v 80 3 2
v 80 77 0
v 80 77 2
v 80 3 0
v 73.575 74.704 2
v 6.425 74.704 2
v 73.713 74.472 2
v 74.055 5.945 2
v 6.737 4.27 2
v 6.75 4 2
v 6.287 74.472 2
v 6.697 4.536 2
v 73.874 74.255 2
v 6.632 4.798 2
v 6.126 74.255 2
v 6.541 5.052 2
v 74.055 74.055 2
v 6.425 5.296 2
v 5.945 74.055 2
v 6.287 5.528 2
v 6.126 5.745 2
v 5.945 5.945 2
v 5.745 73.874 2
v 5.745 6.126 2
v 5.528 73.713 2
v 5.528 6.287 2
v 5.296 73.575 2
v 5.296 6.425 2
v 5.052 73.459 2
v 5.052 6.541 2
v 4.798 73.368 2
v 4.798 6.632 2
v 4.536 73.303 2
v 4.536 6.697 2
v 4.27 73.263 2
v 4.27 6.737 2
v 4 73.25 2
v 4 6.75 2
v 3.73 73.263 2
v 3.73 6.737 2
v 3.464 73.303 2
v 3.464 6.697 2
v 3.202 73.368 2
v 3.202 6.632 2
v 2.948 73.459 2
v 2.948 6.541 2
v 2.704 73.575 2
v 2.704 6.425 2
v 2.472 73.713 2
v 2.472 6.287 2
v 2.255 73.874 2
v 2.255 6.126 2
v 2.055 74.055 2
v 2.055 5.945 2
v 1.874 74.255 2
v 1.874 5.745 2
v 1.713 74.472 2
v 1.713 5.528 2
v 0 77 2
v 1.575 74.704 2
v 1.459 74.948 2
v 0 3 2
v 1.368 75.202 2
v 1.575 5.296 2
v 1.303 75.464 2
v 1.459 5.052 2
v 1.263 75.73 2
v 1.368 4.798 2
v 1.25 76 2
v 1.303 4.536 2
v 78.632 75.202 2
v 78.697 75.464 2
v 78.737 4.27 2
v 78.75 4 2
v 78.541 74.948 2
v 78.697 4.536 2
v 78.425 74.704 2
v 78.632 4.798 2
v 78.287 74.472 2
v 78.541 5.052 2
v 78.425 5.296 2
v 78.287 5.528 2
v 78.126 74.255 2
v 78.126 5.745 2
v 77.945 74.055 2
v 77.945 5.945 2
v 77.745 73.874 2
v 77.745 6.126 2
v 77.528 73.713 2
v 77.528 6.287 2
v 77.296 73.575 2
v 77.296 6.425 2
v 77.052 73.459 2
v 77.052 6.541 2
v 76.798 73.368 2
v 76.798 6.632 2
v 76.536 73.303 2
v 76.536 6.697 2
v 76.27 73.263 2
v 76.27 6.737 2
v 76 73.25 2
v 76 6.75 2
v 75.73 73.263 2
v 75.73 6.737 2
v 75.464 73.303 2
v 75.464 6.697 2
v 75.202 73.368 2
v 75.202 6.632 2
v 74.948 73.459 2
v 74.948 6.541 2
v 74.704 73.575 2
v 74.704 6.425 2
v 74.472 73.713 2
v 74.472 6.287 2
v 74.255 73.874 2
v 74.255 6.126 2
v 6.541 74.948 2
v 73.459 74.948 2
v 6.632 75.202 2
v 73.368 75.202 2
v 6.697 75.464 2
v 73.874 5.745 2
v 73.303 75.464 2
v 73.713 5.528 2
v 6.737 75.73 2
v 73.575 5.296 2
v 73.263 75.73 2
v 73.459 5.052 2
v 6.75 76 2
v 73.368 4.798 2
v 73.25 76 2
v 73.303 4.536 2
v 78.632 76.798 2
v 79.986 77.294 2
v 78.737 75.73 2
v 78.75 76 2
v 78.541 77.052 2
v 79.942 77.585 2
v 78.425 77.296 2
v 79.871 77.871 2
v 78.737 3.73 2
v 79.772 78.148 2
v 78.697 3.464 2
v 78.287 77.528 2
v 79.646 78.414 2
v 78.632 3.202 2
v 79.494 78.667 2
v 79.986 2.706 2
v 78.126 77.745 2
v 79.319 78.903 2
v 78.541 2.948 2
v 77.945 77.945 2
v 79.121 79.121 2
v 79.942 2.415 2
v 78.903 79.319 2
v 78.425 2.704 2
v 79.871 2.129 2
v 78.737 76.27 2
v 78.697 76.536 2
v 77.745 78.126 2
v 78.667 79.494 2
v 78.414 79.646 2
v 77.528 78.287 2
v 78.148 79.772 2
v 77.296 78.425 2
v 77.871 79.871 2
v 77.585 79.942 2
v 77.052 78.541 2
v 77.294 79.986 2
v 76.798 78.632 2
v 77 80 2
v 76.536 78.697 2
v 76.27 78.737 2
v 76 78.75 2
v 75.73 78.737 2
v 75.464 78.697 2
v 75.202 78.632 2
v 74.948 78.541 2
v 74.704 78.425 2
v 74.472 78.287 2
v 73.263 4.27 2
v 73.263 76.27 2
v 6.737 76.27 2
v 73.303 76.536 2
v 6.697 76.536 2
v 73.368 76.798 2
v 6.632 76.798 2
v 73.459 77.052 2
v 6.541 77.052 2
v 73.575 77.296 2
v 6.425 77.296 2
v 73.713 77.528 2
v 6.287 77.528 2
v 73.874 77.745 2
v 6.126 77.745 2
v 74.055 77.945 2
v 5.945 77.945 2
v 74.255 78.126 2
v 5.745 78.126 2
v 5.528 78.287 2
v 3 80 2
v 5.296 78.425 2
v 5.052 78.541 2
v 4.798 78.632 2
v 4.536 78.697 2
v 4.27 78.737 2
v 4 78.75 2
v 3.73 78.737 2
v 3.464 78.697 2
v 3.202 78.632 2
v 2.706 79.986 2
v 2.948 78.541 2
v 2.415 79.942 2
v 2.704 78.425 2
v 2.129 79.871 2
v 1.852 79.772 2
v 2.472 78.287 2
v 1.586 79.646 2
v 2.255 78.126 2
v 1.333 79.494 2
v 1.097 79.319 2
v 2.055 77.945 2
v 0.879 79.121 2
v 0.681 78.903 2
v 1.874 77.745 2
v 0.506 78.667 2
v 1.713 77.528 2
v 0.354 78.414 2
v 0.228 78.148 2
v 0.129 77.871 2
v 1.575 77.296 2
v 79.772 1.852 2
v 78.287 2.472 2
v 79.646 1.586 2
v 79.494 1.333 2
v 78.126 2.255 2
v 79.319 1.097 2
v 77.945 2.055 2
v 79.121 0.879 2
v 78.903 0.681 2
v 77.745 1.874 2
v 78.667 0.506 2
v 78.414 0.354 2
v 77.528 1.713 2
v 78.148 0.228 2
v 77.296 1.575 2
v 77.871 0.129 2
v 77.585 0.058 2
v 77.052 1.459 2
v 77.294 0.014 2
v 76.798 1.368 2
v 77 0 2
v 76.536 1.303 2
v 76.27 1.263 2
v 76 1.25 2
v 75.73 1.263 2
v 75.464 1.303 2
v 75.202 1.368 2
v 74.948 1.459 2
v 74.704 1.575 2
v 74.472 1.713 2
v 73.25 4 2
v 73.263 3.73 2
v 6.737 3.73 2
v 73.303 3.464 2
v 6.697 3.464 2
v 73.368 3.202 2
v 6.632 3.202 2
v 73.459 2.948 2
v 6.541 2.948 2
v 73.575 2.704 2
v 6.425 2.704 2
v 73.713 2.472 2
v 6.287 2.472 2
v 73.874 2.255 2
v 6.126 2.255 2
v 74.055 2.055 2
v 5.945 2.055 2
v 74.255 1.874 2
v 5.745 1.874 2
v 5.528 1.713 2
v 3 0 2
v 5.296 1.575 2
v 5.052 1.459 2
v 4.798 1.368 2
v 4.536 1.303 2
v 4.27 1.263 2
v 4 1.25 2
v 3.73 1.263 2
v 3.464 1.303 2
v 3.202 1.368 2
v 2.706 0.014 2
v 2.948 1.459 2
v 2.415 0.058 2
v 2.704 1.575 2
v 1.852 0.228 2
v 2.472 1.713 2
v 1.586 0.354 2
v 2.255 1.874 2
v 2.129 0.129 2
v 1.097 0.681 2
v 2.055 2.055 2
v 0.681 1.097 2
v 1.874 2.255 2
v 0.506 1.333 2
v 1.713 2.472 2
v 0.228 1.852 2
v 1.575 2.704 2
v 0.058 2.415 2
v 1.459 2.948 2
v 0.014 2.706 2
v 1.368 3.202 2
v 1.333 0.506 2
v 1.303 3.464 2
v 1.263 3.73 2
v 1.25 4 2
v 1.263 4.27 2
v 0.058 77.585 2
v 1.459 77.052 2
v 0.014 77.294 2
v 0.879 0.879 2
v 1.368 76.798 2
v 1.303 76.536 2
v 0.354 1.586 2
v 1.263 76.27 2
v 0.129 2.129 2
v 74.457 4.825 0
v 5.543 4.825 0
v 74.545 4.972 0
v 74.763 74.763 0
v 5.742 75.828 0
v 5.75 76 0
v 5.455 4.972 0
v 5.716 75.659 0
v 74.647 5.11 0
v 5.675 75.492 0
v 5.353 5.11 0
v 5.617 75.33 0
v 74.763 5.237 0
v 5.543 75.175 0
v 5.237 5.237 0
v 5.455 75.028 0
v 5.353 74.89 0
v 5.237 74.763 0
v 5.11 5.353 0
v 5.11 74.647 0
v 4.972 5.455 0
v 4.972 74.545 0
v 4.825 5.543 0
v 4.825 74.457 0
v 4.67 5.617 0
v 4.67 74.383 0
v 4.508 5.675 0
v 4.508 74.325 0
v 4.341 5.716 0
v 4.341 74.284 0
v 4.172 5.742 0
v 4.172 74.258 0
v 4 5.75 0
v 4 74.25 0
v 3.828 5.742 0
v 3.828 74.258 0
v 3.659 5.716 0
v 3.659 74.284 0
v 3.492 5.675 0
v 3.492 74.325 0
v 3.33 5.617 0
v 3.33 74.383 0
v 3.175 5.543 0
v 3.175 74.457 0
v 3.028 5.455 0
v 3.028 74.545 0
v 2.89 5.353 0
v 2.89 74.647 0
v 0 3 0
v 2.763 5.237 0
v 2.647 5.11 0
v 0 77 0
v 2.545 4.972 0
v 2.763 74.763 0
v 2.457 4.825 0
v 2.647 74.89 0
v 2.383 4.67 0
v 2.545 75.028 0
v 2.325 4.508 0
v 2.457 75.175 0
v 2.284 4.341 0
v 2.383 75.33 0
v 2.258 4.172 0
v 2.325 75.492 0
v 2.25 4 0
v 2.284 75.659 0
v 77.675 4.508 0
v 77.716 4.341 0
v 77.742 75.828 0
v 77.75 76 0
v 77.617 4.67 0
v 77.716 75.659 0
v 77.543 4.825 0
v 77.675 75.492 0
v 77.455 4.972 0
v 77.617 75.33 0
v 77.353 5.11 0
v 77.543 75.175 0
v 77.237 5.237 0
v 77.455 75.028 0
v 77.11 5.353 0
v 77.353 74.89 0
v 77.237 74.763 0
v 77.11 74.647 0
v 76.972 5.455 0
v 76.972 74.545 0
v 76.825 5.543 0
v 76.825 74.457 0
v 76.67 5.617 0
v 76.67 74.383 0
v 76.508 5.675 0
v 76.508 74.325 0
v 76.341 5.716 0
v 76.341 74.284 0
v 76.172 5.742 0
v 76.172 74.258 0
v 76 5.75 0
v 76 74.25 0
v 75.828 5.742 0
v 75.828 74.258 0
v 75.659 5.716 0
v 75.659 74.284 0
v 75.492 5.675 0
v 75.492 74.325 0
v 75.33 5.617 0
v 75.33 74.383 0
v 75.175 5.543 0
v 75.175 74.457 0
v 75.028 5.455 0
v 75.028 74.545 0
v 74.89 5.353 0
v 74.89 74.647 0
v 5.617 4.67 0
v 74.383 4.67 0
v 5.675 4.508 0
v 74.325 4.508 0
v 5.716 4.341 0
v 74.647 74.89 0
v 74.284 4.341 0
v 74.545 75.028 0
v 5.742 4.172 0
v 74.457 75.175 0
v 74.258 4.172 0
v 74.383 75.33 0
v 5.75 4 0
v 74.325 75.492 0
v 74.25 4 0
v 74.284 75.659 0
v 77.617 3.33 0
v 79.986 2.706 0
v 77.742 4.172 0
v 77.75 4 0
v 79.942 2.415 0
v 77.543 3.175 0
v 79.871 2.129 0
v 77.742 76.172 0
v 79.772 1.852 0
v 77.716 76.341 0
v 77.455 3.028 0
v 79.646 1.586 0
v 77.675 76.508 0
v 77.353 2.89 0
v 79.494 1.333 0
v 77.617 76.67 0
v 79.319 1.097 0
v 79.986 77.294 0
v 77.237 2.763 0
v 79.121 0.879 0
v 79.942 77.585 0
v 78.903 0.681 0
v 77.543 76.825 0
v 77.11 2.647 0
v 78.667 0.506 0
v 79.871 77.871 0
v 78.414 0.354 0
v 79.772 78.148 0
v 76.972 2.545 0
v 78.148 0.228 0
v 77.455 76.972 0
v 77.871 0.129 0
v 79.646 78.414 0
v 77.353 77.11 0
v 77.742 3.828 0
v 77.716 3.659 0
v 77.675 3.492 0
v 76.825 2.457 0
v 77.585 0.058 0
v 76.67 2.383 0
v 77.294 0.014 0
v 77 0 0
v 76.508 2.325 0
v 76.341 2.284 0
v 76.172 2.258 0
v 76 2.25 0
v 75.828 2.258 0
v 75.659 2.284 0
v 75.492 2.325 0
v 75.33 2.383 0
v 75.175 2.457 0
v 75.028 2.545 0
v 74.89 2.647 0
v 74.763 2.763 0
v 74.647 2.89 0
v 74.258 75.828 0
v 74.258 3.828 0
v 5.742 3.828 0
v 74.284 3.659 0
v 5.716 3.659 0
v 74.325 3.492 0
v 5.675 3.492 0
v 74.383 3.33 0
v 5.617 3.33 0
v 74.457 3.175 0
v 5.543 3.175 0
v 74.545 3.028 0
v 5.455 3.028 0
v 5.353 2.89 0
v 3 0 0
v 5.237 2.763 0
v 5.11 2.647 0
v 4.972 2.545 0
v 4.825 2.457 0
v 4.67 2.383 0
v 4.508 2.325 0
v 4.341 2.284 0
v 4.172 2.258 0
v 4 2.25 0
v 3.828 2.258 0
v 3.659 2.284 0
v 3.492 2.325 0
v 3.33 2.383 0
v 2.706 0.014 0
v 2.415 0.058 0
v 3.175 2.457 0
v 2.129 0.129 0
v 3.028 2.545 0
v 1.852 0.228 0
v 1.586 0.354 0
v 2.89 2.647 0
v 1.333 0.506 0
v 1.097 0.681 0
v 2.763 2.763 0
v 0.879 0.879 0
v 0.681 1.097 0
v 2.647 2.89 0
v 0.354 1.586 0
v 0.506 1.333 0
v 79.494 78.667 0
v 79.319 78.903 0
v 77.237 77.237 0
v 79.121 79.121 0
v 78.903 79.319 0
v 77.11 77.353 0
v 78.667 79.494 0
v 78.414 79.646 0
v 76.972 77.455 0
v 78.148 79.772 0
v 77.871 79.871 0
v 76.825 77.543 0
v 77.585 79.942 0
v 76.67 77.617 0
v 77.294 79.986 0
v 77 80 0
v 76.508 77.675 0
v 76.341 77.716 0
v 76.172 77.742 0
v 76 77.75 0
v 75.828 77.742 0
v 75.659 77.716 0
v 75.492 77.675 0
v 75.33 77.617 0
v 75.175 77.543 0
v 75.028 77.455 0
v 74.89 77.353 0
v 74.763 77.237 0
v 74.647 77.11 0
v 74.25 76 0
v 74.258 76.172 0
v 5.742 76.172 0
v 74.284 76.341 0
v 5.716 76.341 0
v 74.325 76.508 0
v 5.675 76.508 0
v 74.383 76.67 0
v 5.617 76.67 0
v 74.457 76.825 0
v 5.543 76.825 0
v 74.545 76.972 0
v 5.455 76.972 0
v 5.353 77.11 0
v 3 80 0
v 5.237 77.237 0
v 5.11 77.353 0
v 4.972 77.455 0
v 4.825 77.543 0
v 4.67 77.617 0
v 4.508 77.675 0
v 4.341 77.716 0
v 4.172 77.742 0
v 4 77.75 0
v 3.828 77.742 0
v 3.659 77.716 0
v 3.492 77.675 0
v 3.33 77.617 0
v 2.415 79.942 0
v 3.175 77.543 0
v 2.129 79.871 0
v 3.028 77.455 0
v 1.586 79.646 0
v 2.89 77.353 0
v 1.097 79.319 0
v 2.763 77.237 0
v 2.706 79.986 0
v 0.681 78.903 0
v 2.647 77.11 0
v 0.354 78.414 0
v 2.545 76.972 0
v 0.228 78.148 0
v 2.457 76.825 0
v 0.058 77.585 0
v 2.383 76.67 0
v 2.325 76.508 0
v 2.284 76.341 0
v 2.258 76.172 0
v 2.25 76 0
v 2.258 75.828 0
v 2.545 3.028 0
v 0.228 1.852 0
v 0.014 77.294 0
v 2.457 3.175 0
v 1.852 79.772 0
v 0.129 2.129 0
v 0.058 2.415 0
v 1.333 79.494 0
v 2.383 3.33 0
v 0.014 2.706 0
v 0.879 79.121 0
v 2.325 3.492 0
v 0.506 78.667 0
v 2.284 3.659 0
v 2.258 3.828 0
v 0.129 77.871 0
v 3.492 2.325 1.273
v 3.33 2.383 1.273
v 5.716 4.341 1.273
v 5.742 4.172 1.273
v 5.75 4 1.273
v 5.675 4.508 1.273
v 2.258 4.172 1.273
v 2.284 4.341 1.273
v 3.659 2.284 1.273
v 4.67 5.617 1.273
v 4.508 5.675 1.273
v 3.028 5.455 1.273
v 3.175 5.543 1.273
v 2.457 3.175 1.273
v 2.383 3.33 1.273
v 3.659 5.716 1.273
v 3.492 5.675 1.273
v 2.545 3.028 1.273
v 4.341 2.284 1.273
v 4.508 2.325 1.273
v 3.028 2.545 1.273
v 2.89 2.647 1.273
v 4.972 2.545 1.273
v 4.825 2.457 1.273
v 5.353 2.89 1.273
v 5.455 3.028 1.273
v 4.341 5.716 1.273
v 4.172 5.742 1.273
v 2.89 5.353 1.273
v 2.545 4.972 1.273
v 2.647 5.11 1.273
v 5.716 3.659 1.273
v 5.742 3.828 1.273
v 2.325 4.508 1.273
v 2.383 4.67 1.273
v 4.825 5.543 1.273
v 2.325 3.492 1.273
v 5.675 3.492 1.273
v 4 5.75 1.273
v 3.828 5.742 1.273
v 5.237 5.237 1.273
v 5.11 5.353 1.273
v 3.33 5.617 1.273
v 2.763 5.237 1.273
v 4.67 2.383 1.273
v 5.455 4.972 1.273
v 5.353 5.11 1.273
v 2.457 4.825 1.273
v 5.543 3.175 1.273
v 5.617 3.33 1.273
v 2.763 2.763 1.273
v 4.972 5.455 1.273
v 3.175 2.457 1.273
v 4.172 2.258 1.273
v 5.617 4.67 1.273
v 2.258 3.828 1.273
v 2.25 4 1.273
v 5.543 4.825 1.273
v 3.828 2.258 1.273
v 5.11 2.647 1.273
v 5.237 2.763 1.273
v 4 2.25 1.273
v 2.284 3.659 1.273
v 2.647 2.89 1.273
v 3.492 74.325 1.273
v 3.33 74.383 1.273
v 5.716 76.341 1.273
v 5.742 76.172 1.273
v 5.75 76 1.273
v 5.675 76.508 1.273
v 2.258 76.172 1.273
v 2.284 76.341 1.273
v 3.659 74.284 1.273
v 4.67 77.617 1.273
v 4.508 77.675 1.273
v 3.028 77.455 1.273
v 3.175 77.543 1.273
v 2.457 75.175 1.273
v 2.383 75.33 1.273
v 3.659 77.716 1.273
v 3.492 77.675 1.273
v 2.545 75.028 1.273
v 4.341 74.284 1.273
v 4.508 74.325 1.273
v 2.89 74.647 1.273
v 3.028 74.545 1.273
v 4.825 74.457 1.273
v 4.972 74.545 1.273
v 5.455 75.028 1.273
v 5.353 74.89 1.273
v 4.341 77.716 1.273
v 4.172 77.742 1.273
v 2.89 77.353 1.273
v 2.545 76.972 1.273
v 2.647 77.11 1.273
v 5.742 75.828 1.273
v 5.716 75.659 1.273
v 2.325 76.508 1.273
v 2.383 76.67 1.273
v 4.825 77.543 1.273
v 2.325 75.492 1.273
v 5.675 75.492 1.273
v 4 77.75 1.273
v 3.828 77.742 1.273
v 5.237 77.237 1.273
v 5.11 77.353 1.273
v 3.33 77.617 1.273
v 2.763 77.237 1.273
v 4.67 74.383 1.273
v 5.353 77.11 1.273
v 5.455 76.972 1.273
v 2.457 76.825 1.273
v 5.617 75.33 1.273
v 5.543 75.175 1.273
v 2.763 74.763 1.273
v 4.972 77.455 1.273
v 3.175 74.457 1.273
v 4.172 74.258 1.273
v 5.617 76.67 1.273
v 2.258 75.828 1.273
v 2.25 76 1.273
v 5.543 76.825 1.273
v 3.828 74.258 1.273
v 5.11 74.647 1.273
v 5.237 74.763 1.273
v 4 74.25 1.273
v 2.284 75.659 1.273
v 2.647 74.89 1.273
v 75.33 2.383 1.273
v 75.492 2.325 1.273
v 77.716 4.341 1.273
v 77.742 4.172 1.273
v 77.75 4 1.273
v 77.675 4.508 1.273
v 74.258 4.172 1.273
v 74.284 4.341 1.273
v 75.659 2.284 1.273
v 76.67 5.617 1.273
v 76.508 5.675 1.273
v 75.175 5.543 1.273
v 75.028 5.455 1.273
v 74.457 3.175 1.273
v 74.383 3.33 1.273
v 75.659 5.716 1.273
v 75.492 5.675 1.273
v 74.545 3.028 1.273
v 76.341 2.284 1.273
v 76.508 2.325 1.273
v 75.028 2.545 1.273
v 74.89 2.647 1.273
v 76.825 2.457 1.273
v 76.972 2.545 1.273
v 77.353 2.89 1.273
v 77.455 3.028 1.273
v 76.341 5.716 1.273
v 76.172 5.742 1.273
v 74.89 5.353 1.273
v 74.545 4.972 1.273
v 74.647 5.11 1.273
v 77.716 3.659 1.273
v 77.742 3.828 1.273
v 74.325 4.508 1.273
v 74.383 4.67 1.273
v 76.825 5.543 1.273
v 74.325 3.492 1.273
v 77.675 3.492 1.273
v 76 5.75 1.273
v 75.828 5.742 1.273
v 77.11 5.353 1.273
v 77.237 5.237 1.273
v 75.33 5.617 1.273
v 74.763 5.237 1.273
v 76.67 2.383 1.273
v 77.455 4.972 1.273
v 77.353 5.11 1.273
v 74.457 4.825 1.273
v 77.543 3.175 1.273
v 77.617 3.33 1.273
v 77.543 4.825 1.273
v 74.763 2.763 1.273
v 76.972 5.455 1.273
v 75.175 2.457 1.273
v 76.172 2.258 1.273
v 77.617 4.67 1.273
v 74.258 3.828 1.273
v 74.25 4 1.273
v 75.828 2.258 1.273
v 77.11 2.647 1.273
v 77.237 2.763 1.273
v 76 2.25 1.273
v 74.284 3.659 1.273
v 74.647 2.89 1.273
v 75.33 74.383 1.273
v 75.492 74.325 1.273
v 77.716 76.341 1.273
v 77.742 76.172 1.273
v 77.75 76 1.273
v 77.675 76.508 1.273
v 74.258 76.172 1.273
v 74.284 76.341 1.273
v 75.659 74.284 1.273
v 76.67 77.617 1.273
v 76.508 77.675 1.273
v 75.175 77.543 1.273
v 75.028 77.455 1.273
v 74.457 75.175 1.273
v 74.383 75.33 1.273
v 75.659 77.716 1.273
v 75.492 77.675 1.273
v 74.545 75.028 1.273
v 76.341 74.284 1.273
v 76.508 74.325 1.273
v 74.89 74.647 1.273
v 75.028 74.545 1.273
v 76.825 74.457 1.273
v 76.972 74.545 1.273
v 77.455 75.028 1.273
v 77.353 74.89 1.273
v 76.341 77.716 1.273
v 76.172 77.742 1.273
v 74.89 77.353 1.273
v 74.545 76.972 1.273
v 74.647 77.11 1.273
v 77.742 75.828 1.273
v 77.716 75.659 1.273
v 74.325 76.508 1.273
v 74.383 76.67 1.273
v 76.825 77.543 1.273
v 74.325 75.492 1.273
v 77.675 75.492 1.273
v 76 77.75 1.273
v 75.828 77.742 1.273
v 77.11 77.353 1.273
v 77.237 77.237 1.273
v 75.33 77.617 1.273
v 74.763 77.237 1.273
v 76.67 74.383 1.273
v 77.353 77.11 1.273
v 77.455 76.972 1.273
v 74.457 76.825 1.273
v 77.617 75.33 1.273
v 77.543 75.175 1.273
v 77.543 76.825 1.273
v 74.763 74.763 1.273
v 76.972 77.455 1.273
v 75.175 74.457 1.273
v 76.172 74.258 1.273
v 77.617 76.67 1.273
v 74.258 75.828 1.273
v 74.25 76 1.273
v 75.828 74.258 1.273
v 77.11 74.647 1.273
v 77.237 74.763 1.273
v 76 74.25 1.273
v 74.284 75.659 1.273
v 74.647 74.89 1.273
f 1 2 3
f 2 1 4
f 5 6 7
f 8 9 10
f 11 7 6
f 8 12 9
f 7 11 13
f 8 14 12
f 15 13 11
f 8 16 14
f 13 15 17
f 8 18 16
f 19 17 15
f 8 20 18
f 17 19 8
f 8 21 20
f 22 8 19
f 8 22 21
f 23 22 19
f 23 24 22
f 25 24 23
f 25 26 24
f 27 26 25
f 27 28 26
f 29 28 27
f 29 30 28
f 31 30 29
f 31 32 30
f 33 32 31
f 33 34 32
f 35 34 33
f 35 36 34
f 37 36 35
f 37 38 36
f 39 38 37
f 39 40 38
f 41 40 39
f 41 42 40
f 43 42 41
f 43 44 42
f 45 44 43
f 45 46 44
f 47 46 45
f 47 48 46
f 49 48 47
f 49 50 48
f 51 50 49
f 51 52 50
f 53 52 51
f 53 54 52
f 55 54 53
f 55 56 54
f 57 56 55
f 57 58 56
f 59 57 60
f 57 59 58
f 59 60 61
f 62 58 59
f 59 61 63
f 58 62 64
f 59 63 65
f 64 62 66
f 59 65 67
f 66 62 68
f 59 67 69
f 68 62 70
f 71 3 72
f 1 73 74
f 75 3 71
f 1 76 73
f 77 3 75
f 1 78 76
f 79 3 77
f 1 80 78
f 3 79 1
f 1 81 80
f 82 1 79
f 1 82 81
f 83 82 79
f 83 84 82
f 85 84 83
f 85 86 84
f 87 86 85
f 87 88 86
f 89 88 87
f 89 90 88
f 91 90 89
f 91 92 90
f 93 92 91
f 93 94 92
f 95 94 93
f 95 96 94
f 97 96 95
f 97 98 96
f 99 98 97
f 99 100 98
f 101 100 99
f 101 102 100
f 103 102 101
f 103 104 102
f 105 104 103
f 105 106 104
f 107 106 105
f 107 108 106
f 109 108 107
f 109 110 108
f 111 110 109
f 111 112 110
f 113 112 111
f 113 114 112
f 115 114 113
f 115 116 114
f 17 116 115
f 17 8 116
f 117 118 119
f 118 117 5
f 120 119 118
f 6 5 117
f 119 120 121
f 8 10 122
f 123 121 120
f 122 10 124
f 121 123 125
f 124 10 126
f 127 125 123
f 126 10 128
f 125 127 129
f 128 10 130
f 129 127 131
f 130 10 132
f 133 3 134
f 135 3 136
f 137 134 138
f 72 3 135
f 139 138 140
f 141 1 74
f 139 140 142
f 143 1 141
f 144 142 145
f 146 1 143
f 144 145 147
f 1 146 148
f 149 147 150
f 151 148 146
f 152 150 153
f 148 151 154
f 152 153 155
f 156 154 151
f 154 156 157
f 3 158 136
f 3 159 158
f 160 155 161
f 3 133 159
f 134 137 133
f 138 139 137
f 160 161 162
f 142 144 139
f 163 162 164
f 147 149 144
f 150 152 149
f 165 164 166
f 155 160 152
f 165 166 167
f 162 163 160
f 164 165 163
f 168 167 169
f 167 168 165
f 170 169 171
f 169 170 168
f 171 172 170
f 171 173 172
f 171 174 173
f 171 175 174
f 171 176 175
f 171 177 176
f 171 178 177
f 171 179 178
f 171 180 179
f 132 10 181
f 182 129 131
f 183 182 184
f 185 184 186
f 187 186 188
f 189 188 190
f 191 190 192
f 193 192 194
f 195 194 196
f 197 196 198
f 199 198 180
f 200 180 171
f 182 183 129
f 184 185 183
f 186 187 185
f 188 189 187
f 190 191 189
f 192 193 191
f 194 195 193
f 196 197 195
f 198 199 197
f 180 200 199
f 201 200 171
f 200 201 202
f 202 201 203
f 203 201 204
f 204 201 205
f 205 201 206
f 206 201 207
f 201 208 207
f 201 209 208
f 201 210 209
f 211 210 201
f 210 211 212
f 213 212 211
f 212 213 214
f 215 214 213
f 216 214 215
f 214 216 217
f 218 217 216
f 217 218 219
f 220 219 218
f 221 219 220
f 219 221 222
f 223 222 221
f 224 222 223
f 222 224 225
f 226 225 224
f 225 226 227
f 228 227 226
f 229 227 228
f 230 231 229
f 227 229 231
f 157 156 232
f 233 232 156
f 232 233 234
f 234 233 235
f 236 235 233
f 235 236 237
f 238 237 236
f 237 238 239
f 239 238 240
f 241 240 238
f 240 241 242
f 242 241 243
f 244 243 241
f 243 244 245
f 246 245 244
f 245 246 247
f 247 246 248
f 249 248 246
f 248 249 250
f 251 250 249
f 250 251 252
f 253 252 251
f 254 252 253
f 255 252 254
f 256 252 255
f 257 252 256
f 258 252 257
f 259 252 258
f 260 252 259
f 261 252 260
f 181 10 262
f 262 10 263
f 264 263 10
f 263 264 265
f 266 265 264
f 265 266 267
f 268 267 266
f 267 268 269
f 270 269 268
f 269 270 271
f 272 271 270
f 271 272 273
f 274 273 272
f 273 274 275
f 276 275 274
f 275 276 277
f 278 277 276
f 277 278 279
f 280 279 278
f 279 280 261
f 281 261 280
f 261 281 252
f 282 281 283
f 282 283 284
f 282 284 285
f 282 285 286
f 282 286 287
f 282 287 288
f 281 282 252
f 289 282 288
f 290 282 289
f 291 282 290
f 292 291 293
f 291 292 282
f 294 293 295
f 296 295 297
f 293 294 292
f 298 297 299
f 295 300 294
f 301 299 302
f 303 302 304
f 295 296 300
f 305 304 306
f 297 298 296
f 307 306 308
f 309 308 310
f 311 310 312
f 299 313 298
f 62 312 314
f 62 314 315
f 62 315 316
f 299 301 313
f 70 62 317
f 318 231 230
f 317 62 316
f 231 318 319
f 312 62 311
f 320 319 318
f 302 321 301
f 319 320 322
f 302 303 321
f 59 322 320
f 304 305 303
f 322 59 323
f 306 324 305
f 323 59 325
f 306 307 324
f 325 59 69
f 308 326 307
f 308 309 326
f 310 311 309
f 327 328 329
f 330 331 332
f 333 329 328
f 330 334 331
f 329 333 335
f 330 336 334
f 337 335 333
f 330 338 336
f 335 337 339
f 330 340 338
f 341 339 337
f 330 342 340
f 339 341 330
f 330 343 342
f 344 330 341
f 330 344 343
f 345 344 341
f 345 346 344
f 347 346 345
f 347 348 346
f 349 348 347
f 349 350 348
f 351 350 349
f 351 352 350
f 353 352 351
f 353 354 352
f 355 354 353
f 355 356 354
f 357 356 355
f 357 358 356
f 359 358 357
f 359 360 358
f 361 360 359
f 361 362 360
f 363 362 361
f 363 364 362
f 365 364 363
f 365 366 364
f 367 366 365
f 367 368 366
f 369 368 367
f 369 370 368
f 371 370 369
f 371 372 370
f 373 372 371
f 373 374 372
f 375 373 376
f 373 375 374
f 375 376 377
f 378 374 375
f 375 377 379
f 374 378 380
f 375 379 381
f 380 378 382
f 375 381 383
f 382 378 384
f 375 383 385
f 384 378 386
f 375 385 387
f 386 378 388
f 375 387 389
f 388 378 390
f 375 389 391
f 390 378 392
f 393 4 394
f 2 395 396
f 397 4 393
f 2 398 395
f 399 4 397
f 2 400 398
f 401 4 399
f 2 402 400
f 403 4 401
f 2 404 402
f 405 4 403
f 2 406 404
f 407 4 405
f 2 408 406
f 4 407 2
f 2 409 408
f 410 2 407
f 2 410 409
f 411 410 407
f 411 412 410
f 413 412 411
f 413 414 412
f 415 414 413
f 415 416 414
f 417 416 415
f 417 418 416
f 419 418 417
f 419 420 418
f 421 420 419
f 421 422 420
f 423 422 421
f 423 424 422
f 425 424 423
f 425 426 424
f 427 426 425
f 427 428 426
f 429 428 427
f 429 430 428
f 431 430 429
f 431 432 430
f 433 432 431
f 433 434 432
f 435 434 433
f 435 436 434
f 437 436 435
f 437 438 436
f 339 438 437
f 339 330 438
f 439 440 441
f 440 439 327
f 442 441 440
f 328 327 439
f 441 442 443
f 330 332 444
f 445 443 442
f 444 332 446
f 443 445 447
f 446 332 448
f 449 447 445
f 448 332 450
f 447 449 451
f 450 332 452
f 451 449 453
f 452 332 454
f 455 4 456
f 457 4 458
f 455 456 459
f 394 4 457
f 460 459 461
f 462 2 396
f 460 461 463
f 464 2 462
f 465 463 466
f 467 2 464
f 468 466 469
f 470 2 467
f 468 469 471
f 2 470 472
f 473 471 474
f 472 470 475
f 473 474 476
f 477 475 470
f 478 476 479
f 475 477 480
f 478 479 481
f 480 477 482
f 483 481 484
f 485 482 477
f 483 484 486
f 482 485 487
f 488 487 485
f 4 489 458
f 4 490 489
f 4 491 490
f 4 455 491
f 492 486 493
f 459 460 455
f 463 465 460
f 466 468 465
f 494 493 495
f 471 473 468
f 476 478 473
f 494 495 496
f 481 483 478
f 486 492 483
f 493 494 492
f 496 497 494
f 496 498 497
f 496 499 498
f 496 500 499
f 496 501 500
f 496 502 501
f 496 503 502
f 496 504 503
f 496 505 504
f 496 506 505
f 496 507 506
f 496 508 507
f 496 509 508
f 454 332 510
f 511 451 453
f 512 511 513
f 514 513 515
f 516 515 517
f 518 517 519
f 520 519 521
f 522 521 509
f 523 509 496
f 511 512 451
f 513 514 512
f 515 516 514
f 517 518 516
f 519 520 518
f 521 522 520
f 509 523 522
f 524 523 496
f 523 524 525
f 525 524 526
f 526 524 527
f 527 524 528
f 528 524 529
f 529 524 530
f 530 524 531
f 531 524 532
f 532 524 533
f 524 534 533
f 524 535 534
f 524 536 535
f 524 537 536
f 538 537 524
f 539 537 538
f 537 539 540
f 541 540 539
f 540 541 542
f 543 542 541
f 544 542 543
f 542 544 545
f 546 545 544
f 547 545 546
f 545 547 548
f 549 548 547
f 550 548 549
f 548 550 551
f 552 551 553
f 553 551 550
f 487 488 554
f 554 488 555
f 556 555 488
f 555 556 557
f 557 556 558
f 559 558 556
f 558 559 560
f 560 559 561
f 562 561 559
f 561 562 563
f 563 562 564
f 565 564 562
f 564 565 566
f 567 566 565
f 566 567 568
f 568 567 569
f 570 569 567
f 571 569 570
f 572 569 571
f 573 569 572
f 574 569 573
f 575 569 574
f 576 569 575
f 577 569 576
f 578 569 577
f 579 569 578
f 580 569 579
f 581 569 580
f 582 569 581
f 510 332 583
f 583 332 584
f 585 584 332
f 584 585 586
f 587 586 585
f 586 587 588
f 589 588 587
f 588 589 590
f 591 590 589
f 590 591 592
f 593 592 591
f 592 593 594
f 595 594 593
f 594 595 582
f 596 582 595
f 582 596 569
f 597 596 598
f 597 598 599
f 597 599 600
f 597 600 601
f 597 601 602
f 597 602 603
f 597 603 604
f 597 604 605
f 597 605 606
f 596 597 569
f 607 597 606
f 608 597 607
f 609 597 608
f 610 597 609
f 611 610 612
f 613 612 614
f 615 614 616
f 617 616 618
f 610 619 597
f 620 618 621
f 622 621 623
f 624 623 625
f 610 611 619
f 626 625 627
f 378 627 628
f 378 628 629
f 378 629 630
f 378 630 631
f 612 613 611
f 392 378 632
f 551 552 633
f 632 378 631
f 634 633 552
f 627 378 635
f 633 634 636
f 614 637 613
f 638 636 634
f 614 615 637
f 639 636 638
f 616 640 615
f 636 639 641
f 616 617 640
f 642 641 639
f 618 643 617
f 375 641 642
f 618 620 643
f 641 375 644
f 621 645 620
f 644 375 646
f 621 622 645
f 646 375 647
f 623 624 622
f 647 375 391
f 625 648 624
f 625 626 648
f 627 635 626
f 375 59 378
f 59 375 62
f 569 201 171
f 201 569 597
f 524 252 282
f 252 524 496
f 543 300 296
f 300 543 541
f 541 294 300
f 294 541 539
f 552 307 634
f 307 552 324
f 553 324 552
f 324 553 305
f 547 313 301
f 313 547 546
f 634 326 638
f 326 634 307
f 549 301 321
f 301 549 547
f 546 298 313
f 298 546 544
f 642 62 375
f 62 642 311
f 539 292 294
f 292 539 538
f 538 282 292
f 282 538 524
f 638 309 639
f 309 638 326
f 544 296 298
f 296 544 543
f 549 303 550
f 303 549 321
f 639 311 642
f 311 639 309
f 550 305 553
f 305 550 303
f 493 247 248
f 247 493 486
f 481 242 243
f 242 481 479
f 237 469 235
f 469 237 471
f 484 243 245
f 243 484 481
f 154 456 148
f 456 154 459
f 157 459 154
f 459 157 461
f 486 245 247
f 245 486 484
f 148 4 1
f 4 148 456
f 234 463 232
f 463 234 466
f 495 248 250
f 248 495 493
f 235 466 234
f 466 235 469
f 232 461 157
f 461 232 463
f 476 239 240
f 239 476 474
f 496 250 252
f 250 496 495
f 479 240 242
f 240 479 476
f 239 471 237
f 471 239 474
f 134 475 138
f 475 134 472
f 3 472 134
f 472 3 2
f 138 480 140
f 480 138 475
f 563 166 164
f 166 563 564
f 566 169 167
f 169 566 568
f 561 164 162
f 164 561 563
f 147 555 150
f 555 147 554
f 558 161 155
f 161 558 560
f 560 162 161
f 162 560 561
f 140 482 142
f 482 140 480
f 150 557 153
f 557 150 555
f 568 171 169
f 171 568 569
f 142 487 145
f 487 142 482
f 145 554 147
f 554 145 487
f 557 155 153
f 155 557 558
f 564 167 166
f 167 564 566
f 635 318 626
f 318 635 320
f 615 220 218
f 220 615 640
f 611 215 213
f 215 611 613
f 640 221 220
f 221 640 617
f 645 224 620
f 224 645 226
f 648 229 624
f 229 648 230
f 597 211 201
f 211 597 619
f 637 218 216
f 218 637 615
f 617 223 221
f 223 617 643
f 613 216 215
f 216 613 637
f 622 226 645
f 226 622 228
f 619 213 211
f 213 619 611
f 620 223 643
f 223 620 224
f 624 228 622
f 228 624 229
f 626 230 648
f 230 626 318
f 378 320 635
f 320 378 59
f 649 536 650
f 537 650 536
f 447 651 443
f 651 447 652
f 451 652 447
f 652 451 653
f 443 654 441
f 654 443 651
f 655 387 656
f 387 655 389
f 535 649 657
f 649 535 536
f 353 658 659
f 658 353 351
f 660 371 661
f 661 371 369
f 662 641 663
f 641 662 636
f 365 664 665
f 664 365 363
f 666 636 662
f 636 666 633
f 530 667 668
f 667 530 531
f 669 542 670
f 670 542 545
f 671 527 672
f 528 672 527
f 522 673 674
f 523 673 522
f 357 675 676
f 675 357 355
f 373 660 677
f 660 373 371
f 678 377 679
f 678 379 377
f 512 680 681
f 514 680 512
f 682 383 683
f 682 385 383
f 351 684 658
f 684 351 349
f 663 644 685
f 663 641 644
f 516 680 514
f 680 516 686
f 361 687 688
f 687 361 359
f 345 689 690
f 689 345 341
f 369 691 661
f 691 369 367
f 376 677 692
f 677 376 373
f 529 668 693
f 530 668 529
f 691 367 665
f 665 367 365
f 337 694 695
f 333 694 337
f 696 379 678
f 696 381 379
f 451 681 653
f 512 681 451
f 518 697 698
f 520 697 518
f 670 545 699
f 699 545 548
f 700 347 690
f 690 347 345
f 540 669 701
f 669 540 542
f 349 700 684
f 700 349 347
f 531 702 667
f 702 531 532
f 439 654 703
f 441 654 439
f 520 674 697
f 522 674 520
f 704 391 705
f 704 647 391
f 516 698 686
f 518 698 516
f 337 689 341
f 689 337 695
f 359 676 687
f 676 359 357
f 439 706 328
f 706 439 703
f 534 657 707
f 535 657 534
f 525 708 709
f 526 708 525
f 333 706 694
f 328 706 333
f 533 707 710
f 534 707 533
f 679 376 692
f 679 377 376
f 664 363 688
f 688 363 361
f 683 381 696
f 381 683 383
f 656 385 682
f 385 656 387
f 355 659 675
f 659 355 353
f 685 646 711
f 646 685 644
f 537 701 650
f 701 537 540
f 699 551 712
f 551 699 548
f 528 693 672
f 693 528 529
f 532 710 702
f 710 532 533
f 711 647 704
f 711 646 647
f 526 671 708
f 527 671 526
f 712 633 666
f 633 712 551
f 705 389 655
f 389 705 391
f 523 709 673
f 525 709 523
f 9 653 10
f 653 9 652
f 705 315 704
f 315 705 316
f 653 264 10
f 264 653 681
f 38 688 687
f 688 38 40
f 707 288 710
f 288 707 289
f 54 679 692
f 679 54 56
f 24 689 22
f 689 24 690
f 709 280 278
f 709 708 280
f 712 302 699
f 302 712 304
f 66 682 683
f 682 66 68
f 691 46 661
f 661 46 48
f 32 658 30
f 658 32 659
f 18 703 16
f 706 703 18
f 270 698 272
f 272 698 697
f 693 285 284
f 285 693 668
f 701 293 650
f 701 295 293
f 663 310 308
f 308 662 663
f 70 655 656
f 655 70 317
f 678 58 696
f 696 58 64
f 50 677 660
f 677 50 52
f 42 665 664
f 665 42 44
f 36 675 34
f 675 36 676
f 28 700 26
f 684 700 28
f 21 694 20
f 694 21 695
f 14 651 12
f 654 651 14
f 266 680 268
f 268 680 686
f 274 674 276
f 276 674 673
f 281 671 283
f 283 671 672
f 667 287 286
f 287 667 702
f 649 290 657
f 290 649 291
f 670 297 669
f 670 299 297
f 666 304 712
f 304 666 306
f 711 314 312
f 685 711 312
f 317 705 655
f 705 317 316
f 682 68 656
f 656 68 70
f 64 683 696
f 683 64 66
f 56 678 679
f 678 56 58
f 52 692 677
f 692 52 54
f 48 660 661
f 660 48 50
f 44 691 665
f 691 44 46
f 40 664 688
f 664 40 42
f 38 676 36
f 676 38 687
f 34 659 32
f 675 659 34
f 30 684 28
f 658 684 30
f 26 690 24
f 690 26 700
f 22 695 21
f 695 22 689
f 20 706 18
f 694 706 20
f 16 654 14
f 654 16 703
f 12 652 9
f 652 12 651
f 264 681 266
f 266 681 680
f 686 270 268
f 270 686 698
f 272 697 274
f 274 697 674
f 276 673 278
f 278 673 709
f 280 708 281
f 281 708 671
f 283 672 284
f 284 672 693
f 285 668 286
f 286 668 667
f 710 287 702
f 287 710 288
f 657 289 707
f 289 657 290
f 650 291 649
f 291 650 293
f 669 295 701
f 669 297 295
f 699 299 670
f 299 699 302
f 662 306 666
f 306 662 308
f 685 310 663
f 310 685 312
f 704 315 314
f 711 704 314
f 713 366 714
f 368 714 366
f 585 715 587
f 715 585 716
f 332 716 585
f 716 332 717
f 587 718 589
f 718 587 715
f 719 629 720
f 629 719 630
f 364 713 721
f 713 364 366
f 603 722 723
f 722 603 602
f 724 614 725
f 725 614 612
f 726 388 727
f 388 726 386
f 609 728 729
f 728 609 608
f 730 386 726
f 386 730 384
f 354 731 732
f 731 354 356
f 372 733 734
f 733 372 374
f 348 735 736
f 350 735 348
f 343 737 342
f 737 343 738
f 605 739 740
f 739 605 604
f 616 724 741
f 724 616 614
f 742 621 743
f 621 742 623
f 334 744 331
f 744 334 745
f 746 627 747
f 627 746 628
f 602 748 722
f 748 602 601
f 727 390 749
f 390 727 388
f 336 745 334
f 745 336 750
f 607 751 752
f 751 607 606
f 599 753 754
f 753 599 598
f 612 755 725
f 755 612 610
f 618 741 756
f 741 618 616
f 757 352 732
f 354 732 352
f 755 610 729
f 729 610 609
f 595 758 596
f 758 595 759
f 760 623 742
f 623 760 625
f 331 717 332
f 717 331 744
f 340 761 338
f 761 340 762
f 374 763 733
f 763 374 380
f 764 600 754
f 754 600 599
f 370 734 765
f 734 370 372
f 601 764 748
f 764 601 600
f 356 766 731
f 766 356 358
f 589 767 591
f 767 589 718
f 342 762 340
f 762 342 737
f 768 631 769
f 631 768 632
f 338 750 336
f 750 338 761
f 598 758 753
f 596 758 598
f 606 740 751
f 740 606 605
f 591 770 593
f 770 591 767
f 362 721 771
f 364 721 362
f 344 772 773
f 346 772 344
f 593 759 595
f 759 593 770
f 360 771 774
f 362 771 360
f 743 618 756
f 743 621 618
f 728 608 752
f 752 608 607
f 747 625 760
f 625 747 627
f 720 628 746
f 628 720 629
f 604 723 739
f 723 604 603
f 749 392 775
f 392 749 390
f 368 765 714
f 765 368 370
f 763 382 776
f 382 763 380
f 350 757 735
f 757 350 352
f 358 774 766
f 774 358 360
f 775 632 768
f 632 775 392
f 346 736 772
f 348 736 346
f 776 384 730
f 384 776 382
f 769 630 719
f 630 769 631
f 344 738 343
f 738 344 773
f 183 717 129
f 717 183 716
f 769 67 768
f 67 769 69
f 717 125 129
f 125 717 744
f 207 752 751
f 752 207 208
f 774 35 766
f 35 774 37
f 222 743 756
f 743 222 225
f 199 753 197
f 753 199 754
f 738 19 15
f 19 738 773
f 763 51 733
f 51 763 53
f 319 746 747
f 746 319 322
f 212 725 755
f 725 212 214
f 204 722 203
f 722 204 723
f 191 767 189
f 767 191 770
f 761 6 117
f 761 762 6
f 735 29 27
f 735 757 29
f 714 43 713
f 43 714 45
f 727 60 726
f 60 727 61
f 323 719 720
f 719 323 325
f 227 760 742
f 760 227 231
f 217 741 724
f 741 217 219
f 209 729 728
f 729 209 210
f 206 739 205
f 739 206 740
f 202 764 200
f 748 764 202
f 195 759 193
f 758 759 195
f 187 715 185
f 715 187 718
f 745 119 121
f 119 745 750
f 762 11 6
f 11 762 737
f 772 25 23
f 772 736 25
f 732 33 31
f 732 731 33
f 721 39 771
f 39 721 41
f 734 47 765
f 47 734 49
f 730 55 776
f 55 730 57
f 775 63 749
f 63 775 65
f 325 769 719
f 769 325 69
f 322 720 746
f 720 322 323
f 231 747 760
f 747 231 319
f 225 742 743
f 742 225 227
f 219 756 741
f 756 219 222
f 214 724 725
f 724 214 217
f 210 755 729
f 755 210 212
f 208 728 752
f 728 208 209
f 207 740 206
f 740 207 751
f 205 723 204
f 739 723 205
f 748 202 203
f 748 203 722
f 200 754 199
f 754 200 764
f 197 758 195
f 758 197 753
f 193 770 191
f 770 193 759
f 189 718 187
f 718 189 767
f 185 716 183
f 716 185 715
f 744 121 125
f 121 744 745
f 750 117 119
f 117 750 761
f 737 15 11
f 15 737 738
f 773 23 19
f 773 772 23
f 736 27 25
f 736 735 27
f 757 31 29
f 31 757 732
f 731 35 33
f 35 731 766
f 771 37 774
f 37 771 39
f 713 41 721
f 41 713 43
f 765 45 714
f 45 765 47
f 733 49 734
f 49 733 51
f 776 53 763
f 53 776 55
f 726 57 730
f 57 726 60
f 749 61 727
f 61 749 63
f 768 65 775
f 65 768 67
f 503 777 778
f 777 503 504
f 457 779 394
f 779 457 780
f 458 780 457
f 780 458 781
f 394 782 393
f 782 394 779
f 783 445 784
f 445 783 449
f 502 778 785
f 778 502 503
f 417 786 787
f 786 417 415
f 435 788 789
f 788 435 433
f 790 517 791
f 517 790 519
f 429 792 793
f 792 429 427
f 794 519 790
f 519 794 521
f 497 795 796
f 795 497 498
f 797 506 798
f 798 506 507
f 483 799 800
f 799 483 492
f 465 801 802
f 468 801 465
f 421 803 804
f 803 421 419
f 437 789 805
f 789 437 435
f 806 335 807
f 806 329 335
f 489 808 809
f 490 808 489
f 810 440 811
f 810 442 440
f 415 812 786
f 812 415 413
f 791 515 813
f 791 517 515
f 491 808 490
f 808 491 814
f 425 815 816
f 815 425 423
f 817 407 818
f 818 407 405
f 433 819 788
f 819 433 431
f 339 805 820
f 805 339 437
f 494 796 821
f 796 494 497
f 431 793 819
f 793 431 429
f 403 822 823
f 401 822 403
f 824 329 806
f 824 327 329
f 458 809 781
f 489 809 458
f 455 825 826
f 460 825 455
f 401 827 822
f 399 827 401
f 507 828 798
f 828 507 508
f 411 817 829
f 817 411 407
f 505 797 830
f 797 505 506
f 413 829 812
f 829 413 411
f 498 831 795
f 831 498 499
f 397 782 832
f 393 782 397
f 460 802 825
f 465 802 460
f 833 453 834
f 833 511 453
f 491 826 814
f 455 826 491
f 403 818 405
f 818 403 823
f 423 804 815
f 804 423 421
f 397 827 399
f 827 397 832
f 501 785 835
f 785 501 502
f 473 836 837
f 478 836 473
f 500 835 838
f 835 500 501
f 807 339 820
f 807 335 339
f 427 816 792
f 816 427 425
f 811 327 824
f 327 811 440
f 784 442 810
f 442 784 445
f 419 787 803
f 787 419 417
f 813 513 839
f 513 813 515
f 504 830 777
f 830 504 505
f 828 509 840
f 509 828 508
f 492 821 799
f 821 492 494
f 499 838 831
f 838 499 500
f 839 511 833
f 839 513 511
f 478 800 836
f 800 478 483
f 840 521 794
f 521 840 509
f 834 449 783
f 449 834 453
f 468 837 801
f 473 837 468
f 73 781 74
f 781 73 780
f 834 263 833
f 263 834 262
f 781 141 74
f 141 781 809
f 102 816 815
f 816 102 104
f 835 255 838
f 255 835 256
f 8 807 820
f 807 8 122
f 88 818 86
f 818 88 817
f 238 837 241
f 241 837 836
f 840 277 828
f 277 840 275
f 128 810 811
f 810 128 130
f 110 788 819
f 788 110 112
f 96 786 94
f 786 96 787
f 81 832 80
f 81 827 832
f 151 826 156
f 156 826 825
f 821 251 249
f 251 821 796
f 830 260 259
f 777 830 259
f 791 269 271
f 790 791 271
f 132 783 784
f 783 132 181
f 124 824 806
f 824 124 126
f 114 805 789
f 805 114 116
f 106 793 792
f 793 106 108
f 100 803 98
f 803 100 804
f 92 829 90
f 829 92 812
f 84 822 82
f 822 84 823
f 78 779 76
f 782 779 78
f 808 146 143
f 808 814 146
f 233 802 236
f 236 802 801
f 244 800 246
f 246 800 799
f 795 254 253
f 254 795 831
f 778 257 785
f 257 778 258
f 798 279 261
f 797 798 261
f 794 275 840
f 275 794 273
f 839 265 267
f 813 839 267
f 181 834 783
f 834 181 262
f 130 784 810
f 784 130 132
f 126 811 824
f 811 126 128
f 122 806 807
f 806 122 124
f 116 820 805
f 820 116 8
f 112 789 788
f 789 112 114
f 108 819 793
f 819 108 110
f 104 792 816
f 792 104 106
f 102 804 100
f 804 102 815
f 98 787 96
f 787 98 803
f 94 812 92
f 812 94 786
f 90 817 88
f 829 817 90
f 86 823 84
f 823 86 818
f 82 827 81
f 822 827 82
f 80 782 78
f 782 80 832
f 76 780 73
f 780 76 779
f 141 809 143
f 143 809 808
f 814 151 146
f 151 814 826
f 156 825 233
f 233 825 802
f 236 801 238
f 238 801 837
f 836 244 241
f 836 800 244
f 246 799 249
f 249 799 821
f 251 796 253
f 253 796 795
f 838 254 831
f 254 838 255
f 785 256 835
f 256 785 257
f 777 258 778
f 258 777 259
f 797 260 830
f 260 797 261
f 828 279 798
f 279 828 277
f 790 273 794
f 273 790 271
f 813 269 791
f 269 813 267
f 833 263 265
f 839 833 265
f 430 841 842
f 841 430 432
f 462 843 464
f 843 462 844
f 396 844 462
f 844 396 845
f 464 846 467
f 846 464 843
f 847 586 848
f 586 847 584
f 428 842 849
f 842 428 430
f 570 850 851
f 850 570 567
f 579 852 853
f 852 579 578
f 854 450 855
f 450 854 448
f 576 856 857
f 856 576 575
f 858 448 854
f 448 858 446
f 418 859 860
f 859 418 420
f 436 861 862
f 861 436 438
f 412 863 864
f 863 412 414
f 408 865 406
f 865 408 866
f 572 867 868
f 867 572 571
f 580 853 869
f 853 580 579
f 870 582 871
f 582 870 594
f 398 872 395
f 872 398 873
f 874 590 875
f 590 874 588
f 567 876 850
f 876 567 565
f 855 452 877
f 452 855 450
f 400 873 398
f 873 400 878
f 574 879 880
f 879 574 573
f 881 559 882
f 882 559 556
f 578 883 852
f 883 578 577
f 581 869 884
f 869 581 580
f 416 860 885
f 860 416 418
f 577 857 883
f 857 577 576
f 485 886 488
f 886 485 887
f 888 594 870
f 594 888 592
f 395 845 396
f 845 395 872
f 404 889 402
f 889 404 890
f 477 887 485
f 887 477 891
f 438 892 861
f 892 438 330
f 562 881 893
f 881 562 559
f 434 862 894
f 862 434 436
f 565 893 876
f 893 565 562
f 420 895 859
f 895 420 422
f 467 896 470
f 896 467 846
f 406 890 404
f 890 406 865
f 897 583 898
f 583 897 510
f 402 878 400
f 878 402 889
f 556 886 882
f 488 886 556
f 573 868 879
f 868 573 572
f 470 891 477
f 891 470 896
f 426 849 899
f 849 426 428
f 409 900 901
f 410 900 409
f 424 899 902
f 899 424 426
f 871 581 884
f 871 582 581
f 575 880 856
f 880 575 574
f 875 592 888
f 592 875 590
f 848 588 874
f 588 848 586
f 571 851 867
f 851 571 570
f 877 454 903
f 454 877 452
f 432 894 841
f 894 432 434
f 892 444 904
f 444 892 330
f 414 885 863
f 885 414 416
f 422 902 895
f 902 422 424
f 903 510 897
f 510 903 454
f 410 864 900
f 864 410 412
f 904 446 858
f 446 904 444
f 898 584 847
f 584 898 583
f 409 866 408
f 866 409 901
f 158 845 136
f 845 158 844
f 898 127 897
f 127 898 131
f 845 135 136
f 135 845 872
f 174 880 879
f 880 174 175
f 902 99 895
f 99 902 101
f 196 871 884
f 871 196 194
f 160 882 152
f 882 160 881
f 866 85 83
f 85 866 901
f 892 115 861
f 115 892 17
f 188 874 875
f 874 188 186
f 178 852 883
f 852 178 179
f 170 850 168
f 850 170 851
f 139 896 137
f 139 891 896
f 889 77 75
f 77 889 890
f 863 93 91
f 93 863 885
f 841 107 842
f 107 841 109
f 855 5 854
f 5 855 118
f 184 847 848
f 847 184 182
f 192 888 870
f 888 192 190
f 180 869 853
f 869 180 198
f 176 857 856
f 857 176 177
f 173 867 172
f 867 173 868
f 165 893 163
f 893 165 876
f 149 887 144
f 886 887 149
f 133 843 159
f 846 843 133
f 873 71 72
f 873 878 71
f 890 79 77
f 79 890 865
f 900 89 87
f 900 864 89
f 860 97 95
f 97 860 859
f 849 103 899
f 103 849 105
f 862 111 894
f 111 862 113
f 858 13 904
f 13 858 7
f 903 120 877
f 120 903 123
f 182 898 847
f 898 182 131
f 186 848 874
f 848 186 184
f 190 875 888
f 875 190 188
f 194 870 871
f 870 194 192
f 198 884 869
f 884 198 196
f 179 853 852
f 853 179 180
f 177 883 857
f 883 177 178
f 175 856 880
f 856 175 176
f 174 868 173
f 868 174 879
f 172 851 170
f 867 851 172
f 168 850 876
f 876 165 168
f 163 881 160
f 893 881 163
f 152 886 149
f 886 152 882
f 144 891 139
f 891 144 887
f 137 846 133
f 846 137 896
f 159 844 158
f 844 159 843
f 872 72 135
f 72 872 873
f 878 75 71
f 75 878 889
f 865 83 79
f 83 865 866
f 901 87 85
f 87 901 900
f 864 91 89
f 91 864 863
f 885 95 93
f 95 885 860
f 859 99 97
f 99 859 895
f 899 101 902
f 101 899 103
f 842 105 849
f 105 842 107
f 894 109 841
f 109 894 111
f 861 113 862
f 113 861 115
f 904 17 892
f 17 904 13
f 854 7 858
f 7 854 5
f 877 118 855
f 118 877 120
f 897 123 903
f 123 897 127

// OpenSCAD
/* [Size and thickness] */
// fan size in mm
fan_size = 80; // [40:20:200]

// fan grill thickness in mm
grill_thickness = 2;

// plastic thickness around the fan hole in mm
vent_wall_thickness = 1;

fan_duct_chamfer = false;

// screw hole type
screw_hole_type = "t"; // [s:Straight, t:Tapered, i:Inset]

/* [Vent grill bars] */
// number of horzontal grill bars
horizontal_bar_count = 1;
// number of vertical grill bars
vertical_bar_count = 1;

// grill bars thickness
bars_thickness = 1;

// grill bars width
bars_width = 1.2;

/* [Hidden] */
$fn = 64;

screw_hole_diameter = 3.5;
screw_hole_radius = screw_hole_diameter / 2;
screw_hole_radius_wider = screw_hole_radius + 1;
screw_support_thickness = 1;
screw_center_distance_from_edge = 4;

module PrimeShape() {
        union() {
        difference() {
            cube([fan_size, fan_size, grill_thickness]);
            
            // corner chamfer
            translate([3,0,-1])
            rotate([0,0,135])
            cube([5, 5, grill_thickness + 2]);

            translate([fan_size-3,0,-1])
            rotate([0,0,-45])
            cube([5, 5, grill_thickness + 2]);

            translate([fan_size,fan_size-3,-1])
            rotate([0,0,45])
            cube([5, 5, grill_thickness + 2]);

            translate([0,fan_size-3,-1])
            rotate([0,0,45])
            cube([5, 5, grill_thickness + 2]);
        }

        // corner roundness
        translate([3,3,grill_thickness/2])
        cylinder(r=3, h=grill_thickness, center=true);

        translate([fan_size-3,3,grill_thickness/2])
        cylinder(r=3, h=grill_thickness, center=true);

        translate([fan_size-3,fan_size-3,grill_thickness/2])
        cylinder(r=3, h=grill_thickness, center=true);

        translate([3,fan_size-3,grill_thickness/2])
        cylinder(r=3, h=grill_thickness, center=true);
    }
}

module PrimeShapeWithScrewHoles() {
    difference() {
        PrimeShape();

        // screw holes
        ScrewHole(screw_center_distance_from_edge, screw_center_distance_from_edge);
        ScrewHole(screw_center_distance_from_edge, fan_size - screw_center_distance_from_edge);
        ScrewHole(fan_size - screw_center_distance_from_edge, screw_center_distance_from_edge);
        ScrewHole(fan_size - screw_center_distance_from_edge, fan_size - screw_center_distance_from_edge);
    }
}

module ScrewHole(x, y) {
    translate([x, y, grill_thickness / 2])
    cylinder(r=screw_hole_diameter / 2, h=grill_thickness + 2, center=true);

    if (screw_hole_type == "i") {
        //inset
        translate([x, y, grill_thickness / 2 + screw_support_thickness])
        cylinder(r=screw_hole_radius + 1, h=grill_thickness, center=true);
    }

    if (screw_hole_type == "t") {
        // tapered
        translate([x, y, grill_thickness])
        cylinder(r1=0, r2=screw_hole_radius_wider * 2, h=4, center=true);
    }
}

difference() {
    PrimeShapeWithScrewHoles();

    // fan duct
    translate([fan_size / 2, fan_size / 2, grill_thickness / 2])
    cylinder(r=fan_size / 2 - vent_wall_thickness, grill_thickness + 2, center=true);

    if (fan_duct_chamfer)
        translate([fan_size / 2, fan_size / 2, grill_thickness])
        cylinder(r1=fan_size / 2 - vent_wall_thickness, r2=fan_size / 2, h=0.4, center=true);
}

intersection() {
    PrimeShapeWithScrewHoles();

    
}
